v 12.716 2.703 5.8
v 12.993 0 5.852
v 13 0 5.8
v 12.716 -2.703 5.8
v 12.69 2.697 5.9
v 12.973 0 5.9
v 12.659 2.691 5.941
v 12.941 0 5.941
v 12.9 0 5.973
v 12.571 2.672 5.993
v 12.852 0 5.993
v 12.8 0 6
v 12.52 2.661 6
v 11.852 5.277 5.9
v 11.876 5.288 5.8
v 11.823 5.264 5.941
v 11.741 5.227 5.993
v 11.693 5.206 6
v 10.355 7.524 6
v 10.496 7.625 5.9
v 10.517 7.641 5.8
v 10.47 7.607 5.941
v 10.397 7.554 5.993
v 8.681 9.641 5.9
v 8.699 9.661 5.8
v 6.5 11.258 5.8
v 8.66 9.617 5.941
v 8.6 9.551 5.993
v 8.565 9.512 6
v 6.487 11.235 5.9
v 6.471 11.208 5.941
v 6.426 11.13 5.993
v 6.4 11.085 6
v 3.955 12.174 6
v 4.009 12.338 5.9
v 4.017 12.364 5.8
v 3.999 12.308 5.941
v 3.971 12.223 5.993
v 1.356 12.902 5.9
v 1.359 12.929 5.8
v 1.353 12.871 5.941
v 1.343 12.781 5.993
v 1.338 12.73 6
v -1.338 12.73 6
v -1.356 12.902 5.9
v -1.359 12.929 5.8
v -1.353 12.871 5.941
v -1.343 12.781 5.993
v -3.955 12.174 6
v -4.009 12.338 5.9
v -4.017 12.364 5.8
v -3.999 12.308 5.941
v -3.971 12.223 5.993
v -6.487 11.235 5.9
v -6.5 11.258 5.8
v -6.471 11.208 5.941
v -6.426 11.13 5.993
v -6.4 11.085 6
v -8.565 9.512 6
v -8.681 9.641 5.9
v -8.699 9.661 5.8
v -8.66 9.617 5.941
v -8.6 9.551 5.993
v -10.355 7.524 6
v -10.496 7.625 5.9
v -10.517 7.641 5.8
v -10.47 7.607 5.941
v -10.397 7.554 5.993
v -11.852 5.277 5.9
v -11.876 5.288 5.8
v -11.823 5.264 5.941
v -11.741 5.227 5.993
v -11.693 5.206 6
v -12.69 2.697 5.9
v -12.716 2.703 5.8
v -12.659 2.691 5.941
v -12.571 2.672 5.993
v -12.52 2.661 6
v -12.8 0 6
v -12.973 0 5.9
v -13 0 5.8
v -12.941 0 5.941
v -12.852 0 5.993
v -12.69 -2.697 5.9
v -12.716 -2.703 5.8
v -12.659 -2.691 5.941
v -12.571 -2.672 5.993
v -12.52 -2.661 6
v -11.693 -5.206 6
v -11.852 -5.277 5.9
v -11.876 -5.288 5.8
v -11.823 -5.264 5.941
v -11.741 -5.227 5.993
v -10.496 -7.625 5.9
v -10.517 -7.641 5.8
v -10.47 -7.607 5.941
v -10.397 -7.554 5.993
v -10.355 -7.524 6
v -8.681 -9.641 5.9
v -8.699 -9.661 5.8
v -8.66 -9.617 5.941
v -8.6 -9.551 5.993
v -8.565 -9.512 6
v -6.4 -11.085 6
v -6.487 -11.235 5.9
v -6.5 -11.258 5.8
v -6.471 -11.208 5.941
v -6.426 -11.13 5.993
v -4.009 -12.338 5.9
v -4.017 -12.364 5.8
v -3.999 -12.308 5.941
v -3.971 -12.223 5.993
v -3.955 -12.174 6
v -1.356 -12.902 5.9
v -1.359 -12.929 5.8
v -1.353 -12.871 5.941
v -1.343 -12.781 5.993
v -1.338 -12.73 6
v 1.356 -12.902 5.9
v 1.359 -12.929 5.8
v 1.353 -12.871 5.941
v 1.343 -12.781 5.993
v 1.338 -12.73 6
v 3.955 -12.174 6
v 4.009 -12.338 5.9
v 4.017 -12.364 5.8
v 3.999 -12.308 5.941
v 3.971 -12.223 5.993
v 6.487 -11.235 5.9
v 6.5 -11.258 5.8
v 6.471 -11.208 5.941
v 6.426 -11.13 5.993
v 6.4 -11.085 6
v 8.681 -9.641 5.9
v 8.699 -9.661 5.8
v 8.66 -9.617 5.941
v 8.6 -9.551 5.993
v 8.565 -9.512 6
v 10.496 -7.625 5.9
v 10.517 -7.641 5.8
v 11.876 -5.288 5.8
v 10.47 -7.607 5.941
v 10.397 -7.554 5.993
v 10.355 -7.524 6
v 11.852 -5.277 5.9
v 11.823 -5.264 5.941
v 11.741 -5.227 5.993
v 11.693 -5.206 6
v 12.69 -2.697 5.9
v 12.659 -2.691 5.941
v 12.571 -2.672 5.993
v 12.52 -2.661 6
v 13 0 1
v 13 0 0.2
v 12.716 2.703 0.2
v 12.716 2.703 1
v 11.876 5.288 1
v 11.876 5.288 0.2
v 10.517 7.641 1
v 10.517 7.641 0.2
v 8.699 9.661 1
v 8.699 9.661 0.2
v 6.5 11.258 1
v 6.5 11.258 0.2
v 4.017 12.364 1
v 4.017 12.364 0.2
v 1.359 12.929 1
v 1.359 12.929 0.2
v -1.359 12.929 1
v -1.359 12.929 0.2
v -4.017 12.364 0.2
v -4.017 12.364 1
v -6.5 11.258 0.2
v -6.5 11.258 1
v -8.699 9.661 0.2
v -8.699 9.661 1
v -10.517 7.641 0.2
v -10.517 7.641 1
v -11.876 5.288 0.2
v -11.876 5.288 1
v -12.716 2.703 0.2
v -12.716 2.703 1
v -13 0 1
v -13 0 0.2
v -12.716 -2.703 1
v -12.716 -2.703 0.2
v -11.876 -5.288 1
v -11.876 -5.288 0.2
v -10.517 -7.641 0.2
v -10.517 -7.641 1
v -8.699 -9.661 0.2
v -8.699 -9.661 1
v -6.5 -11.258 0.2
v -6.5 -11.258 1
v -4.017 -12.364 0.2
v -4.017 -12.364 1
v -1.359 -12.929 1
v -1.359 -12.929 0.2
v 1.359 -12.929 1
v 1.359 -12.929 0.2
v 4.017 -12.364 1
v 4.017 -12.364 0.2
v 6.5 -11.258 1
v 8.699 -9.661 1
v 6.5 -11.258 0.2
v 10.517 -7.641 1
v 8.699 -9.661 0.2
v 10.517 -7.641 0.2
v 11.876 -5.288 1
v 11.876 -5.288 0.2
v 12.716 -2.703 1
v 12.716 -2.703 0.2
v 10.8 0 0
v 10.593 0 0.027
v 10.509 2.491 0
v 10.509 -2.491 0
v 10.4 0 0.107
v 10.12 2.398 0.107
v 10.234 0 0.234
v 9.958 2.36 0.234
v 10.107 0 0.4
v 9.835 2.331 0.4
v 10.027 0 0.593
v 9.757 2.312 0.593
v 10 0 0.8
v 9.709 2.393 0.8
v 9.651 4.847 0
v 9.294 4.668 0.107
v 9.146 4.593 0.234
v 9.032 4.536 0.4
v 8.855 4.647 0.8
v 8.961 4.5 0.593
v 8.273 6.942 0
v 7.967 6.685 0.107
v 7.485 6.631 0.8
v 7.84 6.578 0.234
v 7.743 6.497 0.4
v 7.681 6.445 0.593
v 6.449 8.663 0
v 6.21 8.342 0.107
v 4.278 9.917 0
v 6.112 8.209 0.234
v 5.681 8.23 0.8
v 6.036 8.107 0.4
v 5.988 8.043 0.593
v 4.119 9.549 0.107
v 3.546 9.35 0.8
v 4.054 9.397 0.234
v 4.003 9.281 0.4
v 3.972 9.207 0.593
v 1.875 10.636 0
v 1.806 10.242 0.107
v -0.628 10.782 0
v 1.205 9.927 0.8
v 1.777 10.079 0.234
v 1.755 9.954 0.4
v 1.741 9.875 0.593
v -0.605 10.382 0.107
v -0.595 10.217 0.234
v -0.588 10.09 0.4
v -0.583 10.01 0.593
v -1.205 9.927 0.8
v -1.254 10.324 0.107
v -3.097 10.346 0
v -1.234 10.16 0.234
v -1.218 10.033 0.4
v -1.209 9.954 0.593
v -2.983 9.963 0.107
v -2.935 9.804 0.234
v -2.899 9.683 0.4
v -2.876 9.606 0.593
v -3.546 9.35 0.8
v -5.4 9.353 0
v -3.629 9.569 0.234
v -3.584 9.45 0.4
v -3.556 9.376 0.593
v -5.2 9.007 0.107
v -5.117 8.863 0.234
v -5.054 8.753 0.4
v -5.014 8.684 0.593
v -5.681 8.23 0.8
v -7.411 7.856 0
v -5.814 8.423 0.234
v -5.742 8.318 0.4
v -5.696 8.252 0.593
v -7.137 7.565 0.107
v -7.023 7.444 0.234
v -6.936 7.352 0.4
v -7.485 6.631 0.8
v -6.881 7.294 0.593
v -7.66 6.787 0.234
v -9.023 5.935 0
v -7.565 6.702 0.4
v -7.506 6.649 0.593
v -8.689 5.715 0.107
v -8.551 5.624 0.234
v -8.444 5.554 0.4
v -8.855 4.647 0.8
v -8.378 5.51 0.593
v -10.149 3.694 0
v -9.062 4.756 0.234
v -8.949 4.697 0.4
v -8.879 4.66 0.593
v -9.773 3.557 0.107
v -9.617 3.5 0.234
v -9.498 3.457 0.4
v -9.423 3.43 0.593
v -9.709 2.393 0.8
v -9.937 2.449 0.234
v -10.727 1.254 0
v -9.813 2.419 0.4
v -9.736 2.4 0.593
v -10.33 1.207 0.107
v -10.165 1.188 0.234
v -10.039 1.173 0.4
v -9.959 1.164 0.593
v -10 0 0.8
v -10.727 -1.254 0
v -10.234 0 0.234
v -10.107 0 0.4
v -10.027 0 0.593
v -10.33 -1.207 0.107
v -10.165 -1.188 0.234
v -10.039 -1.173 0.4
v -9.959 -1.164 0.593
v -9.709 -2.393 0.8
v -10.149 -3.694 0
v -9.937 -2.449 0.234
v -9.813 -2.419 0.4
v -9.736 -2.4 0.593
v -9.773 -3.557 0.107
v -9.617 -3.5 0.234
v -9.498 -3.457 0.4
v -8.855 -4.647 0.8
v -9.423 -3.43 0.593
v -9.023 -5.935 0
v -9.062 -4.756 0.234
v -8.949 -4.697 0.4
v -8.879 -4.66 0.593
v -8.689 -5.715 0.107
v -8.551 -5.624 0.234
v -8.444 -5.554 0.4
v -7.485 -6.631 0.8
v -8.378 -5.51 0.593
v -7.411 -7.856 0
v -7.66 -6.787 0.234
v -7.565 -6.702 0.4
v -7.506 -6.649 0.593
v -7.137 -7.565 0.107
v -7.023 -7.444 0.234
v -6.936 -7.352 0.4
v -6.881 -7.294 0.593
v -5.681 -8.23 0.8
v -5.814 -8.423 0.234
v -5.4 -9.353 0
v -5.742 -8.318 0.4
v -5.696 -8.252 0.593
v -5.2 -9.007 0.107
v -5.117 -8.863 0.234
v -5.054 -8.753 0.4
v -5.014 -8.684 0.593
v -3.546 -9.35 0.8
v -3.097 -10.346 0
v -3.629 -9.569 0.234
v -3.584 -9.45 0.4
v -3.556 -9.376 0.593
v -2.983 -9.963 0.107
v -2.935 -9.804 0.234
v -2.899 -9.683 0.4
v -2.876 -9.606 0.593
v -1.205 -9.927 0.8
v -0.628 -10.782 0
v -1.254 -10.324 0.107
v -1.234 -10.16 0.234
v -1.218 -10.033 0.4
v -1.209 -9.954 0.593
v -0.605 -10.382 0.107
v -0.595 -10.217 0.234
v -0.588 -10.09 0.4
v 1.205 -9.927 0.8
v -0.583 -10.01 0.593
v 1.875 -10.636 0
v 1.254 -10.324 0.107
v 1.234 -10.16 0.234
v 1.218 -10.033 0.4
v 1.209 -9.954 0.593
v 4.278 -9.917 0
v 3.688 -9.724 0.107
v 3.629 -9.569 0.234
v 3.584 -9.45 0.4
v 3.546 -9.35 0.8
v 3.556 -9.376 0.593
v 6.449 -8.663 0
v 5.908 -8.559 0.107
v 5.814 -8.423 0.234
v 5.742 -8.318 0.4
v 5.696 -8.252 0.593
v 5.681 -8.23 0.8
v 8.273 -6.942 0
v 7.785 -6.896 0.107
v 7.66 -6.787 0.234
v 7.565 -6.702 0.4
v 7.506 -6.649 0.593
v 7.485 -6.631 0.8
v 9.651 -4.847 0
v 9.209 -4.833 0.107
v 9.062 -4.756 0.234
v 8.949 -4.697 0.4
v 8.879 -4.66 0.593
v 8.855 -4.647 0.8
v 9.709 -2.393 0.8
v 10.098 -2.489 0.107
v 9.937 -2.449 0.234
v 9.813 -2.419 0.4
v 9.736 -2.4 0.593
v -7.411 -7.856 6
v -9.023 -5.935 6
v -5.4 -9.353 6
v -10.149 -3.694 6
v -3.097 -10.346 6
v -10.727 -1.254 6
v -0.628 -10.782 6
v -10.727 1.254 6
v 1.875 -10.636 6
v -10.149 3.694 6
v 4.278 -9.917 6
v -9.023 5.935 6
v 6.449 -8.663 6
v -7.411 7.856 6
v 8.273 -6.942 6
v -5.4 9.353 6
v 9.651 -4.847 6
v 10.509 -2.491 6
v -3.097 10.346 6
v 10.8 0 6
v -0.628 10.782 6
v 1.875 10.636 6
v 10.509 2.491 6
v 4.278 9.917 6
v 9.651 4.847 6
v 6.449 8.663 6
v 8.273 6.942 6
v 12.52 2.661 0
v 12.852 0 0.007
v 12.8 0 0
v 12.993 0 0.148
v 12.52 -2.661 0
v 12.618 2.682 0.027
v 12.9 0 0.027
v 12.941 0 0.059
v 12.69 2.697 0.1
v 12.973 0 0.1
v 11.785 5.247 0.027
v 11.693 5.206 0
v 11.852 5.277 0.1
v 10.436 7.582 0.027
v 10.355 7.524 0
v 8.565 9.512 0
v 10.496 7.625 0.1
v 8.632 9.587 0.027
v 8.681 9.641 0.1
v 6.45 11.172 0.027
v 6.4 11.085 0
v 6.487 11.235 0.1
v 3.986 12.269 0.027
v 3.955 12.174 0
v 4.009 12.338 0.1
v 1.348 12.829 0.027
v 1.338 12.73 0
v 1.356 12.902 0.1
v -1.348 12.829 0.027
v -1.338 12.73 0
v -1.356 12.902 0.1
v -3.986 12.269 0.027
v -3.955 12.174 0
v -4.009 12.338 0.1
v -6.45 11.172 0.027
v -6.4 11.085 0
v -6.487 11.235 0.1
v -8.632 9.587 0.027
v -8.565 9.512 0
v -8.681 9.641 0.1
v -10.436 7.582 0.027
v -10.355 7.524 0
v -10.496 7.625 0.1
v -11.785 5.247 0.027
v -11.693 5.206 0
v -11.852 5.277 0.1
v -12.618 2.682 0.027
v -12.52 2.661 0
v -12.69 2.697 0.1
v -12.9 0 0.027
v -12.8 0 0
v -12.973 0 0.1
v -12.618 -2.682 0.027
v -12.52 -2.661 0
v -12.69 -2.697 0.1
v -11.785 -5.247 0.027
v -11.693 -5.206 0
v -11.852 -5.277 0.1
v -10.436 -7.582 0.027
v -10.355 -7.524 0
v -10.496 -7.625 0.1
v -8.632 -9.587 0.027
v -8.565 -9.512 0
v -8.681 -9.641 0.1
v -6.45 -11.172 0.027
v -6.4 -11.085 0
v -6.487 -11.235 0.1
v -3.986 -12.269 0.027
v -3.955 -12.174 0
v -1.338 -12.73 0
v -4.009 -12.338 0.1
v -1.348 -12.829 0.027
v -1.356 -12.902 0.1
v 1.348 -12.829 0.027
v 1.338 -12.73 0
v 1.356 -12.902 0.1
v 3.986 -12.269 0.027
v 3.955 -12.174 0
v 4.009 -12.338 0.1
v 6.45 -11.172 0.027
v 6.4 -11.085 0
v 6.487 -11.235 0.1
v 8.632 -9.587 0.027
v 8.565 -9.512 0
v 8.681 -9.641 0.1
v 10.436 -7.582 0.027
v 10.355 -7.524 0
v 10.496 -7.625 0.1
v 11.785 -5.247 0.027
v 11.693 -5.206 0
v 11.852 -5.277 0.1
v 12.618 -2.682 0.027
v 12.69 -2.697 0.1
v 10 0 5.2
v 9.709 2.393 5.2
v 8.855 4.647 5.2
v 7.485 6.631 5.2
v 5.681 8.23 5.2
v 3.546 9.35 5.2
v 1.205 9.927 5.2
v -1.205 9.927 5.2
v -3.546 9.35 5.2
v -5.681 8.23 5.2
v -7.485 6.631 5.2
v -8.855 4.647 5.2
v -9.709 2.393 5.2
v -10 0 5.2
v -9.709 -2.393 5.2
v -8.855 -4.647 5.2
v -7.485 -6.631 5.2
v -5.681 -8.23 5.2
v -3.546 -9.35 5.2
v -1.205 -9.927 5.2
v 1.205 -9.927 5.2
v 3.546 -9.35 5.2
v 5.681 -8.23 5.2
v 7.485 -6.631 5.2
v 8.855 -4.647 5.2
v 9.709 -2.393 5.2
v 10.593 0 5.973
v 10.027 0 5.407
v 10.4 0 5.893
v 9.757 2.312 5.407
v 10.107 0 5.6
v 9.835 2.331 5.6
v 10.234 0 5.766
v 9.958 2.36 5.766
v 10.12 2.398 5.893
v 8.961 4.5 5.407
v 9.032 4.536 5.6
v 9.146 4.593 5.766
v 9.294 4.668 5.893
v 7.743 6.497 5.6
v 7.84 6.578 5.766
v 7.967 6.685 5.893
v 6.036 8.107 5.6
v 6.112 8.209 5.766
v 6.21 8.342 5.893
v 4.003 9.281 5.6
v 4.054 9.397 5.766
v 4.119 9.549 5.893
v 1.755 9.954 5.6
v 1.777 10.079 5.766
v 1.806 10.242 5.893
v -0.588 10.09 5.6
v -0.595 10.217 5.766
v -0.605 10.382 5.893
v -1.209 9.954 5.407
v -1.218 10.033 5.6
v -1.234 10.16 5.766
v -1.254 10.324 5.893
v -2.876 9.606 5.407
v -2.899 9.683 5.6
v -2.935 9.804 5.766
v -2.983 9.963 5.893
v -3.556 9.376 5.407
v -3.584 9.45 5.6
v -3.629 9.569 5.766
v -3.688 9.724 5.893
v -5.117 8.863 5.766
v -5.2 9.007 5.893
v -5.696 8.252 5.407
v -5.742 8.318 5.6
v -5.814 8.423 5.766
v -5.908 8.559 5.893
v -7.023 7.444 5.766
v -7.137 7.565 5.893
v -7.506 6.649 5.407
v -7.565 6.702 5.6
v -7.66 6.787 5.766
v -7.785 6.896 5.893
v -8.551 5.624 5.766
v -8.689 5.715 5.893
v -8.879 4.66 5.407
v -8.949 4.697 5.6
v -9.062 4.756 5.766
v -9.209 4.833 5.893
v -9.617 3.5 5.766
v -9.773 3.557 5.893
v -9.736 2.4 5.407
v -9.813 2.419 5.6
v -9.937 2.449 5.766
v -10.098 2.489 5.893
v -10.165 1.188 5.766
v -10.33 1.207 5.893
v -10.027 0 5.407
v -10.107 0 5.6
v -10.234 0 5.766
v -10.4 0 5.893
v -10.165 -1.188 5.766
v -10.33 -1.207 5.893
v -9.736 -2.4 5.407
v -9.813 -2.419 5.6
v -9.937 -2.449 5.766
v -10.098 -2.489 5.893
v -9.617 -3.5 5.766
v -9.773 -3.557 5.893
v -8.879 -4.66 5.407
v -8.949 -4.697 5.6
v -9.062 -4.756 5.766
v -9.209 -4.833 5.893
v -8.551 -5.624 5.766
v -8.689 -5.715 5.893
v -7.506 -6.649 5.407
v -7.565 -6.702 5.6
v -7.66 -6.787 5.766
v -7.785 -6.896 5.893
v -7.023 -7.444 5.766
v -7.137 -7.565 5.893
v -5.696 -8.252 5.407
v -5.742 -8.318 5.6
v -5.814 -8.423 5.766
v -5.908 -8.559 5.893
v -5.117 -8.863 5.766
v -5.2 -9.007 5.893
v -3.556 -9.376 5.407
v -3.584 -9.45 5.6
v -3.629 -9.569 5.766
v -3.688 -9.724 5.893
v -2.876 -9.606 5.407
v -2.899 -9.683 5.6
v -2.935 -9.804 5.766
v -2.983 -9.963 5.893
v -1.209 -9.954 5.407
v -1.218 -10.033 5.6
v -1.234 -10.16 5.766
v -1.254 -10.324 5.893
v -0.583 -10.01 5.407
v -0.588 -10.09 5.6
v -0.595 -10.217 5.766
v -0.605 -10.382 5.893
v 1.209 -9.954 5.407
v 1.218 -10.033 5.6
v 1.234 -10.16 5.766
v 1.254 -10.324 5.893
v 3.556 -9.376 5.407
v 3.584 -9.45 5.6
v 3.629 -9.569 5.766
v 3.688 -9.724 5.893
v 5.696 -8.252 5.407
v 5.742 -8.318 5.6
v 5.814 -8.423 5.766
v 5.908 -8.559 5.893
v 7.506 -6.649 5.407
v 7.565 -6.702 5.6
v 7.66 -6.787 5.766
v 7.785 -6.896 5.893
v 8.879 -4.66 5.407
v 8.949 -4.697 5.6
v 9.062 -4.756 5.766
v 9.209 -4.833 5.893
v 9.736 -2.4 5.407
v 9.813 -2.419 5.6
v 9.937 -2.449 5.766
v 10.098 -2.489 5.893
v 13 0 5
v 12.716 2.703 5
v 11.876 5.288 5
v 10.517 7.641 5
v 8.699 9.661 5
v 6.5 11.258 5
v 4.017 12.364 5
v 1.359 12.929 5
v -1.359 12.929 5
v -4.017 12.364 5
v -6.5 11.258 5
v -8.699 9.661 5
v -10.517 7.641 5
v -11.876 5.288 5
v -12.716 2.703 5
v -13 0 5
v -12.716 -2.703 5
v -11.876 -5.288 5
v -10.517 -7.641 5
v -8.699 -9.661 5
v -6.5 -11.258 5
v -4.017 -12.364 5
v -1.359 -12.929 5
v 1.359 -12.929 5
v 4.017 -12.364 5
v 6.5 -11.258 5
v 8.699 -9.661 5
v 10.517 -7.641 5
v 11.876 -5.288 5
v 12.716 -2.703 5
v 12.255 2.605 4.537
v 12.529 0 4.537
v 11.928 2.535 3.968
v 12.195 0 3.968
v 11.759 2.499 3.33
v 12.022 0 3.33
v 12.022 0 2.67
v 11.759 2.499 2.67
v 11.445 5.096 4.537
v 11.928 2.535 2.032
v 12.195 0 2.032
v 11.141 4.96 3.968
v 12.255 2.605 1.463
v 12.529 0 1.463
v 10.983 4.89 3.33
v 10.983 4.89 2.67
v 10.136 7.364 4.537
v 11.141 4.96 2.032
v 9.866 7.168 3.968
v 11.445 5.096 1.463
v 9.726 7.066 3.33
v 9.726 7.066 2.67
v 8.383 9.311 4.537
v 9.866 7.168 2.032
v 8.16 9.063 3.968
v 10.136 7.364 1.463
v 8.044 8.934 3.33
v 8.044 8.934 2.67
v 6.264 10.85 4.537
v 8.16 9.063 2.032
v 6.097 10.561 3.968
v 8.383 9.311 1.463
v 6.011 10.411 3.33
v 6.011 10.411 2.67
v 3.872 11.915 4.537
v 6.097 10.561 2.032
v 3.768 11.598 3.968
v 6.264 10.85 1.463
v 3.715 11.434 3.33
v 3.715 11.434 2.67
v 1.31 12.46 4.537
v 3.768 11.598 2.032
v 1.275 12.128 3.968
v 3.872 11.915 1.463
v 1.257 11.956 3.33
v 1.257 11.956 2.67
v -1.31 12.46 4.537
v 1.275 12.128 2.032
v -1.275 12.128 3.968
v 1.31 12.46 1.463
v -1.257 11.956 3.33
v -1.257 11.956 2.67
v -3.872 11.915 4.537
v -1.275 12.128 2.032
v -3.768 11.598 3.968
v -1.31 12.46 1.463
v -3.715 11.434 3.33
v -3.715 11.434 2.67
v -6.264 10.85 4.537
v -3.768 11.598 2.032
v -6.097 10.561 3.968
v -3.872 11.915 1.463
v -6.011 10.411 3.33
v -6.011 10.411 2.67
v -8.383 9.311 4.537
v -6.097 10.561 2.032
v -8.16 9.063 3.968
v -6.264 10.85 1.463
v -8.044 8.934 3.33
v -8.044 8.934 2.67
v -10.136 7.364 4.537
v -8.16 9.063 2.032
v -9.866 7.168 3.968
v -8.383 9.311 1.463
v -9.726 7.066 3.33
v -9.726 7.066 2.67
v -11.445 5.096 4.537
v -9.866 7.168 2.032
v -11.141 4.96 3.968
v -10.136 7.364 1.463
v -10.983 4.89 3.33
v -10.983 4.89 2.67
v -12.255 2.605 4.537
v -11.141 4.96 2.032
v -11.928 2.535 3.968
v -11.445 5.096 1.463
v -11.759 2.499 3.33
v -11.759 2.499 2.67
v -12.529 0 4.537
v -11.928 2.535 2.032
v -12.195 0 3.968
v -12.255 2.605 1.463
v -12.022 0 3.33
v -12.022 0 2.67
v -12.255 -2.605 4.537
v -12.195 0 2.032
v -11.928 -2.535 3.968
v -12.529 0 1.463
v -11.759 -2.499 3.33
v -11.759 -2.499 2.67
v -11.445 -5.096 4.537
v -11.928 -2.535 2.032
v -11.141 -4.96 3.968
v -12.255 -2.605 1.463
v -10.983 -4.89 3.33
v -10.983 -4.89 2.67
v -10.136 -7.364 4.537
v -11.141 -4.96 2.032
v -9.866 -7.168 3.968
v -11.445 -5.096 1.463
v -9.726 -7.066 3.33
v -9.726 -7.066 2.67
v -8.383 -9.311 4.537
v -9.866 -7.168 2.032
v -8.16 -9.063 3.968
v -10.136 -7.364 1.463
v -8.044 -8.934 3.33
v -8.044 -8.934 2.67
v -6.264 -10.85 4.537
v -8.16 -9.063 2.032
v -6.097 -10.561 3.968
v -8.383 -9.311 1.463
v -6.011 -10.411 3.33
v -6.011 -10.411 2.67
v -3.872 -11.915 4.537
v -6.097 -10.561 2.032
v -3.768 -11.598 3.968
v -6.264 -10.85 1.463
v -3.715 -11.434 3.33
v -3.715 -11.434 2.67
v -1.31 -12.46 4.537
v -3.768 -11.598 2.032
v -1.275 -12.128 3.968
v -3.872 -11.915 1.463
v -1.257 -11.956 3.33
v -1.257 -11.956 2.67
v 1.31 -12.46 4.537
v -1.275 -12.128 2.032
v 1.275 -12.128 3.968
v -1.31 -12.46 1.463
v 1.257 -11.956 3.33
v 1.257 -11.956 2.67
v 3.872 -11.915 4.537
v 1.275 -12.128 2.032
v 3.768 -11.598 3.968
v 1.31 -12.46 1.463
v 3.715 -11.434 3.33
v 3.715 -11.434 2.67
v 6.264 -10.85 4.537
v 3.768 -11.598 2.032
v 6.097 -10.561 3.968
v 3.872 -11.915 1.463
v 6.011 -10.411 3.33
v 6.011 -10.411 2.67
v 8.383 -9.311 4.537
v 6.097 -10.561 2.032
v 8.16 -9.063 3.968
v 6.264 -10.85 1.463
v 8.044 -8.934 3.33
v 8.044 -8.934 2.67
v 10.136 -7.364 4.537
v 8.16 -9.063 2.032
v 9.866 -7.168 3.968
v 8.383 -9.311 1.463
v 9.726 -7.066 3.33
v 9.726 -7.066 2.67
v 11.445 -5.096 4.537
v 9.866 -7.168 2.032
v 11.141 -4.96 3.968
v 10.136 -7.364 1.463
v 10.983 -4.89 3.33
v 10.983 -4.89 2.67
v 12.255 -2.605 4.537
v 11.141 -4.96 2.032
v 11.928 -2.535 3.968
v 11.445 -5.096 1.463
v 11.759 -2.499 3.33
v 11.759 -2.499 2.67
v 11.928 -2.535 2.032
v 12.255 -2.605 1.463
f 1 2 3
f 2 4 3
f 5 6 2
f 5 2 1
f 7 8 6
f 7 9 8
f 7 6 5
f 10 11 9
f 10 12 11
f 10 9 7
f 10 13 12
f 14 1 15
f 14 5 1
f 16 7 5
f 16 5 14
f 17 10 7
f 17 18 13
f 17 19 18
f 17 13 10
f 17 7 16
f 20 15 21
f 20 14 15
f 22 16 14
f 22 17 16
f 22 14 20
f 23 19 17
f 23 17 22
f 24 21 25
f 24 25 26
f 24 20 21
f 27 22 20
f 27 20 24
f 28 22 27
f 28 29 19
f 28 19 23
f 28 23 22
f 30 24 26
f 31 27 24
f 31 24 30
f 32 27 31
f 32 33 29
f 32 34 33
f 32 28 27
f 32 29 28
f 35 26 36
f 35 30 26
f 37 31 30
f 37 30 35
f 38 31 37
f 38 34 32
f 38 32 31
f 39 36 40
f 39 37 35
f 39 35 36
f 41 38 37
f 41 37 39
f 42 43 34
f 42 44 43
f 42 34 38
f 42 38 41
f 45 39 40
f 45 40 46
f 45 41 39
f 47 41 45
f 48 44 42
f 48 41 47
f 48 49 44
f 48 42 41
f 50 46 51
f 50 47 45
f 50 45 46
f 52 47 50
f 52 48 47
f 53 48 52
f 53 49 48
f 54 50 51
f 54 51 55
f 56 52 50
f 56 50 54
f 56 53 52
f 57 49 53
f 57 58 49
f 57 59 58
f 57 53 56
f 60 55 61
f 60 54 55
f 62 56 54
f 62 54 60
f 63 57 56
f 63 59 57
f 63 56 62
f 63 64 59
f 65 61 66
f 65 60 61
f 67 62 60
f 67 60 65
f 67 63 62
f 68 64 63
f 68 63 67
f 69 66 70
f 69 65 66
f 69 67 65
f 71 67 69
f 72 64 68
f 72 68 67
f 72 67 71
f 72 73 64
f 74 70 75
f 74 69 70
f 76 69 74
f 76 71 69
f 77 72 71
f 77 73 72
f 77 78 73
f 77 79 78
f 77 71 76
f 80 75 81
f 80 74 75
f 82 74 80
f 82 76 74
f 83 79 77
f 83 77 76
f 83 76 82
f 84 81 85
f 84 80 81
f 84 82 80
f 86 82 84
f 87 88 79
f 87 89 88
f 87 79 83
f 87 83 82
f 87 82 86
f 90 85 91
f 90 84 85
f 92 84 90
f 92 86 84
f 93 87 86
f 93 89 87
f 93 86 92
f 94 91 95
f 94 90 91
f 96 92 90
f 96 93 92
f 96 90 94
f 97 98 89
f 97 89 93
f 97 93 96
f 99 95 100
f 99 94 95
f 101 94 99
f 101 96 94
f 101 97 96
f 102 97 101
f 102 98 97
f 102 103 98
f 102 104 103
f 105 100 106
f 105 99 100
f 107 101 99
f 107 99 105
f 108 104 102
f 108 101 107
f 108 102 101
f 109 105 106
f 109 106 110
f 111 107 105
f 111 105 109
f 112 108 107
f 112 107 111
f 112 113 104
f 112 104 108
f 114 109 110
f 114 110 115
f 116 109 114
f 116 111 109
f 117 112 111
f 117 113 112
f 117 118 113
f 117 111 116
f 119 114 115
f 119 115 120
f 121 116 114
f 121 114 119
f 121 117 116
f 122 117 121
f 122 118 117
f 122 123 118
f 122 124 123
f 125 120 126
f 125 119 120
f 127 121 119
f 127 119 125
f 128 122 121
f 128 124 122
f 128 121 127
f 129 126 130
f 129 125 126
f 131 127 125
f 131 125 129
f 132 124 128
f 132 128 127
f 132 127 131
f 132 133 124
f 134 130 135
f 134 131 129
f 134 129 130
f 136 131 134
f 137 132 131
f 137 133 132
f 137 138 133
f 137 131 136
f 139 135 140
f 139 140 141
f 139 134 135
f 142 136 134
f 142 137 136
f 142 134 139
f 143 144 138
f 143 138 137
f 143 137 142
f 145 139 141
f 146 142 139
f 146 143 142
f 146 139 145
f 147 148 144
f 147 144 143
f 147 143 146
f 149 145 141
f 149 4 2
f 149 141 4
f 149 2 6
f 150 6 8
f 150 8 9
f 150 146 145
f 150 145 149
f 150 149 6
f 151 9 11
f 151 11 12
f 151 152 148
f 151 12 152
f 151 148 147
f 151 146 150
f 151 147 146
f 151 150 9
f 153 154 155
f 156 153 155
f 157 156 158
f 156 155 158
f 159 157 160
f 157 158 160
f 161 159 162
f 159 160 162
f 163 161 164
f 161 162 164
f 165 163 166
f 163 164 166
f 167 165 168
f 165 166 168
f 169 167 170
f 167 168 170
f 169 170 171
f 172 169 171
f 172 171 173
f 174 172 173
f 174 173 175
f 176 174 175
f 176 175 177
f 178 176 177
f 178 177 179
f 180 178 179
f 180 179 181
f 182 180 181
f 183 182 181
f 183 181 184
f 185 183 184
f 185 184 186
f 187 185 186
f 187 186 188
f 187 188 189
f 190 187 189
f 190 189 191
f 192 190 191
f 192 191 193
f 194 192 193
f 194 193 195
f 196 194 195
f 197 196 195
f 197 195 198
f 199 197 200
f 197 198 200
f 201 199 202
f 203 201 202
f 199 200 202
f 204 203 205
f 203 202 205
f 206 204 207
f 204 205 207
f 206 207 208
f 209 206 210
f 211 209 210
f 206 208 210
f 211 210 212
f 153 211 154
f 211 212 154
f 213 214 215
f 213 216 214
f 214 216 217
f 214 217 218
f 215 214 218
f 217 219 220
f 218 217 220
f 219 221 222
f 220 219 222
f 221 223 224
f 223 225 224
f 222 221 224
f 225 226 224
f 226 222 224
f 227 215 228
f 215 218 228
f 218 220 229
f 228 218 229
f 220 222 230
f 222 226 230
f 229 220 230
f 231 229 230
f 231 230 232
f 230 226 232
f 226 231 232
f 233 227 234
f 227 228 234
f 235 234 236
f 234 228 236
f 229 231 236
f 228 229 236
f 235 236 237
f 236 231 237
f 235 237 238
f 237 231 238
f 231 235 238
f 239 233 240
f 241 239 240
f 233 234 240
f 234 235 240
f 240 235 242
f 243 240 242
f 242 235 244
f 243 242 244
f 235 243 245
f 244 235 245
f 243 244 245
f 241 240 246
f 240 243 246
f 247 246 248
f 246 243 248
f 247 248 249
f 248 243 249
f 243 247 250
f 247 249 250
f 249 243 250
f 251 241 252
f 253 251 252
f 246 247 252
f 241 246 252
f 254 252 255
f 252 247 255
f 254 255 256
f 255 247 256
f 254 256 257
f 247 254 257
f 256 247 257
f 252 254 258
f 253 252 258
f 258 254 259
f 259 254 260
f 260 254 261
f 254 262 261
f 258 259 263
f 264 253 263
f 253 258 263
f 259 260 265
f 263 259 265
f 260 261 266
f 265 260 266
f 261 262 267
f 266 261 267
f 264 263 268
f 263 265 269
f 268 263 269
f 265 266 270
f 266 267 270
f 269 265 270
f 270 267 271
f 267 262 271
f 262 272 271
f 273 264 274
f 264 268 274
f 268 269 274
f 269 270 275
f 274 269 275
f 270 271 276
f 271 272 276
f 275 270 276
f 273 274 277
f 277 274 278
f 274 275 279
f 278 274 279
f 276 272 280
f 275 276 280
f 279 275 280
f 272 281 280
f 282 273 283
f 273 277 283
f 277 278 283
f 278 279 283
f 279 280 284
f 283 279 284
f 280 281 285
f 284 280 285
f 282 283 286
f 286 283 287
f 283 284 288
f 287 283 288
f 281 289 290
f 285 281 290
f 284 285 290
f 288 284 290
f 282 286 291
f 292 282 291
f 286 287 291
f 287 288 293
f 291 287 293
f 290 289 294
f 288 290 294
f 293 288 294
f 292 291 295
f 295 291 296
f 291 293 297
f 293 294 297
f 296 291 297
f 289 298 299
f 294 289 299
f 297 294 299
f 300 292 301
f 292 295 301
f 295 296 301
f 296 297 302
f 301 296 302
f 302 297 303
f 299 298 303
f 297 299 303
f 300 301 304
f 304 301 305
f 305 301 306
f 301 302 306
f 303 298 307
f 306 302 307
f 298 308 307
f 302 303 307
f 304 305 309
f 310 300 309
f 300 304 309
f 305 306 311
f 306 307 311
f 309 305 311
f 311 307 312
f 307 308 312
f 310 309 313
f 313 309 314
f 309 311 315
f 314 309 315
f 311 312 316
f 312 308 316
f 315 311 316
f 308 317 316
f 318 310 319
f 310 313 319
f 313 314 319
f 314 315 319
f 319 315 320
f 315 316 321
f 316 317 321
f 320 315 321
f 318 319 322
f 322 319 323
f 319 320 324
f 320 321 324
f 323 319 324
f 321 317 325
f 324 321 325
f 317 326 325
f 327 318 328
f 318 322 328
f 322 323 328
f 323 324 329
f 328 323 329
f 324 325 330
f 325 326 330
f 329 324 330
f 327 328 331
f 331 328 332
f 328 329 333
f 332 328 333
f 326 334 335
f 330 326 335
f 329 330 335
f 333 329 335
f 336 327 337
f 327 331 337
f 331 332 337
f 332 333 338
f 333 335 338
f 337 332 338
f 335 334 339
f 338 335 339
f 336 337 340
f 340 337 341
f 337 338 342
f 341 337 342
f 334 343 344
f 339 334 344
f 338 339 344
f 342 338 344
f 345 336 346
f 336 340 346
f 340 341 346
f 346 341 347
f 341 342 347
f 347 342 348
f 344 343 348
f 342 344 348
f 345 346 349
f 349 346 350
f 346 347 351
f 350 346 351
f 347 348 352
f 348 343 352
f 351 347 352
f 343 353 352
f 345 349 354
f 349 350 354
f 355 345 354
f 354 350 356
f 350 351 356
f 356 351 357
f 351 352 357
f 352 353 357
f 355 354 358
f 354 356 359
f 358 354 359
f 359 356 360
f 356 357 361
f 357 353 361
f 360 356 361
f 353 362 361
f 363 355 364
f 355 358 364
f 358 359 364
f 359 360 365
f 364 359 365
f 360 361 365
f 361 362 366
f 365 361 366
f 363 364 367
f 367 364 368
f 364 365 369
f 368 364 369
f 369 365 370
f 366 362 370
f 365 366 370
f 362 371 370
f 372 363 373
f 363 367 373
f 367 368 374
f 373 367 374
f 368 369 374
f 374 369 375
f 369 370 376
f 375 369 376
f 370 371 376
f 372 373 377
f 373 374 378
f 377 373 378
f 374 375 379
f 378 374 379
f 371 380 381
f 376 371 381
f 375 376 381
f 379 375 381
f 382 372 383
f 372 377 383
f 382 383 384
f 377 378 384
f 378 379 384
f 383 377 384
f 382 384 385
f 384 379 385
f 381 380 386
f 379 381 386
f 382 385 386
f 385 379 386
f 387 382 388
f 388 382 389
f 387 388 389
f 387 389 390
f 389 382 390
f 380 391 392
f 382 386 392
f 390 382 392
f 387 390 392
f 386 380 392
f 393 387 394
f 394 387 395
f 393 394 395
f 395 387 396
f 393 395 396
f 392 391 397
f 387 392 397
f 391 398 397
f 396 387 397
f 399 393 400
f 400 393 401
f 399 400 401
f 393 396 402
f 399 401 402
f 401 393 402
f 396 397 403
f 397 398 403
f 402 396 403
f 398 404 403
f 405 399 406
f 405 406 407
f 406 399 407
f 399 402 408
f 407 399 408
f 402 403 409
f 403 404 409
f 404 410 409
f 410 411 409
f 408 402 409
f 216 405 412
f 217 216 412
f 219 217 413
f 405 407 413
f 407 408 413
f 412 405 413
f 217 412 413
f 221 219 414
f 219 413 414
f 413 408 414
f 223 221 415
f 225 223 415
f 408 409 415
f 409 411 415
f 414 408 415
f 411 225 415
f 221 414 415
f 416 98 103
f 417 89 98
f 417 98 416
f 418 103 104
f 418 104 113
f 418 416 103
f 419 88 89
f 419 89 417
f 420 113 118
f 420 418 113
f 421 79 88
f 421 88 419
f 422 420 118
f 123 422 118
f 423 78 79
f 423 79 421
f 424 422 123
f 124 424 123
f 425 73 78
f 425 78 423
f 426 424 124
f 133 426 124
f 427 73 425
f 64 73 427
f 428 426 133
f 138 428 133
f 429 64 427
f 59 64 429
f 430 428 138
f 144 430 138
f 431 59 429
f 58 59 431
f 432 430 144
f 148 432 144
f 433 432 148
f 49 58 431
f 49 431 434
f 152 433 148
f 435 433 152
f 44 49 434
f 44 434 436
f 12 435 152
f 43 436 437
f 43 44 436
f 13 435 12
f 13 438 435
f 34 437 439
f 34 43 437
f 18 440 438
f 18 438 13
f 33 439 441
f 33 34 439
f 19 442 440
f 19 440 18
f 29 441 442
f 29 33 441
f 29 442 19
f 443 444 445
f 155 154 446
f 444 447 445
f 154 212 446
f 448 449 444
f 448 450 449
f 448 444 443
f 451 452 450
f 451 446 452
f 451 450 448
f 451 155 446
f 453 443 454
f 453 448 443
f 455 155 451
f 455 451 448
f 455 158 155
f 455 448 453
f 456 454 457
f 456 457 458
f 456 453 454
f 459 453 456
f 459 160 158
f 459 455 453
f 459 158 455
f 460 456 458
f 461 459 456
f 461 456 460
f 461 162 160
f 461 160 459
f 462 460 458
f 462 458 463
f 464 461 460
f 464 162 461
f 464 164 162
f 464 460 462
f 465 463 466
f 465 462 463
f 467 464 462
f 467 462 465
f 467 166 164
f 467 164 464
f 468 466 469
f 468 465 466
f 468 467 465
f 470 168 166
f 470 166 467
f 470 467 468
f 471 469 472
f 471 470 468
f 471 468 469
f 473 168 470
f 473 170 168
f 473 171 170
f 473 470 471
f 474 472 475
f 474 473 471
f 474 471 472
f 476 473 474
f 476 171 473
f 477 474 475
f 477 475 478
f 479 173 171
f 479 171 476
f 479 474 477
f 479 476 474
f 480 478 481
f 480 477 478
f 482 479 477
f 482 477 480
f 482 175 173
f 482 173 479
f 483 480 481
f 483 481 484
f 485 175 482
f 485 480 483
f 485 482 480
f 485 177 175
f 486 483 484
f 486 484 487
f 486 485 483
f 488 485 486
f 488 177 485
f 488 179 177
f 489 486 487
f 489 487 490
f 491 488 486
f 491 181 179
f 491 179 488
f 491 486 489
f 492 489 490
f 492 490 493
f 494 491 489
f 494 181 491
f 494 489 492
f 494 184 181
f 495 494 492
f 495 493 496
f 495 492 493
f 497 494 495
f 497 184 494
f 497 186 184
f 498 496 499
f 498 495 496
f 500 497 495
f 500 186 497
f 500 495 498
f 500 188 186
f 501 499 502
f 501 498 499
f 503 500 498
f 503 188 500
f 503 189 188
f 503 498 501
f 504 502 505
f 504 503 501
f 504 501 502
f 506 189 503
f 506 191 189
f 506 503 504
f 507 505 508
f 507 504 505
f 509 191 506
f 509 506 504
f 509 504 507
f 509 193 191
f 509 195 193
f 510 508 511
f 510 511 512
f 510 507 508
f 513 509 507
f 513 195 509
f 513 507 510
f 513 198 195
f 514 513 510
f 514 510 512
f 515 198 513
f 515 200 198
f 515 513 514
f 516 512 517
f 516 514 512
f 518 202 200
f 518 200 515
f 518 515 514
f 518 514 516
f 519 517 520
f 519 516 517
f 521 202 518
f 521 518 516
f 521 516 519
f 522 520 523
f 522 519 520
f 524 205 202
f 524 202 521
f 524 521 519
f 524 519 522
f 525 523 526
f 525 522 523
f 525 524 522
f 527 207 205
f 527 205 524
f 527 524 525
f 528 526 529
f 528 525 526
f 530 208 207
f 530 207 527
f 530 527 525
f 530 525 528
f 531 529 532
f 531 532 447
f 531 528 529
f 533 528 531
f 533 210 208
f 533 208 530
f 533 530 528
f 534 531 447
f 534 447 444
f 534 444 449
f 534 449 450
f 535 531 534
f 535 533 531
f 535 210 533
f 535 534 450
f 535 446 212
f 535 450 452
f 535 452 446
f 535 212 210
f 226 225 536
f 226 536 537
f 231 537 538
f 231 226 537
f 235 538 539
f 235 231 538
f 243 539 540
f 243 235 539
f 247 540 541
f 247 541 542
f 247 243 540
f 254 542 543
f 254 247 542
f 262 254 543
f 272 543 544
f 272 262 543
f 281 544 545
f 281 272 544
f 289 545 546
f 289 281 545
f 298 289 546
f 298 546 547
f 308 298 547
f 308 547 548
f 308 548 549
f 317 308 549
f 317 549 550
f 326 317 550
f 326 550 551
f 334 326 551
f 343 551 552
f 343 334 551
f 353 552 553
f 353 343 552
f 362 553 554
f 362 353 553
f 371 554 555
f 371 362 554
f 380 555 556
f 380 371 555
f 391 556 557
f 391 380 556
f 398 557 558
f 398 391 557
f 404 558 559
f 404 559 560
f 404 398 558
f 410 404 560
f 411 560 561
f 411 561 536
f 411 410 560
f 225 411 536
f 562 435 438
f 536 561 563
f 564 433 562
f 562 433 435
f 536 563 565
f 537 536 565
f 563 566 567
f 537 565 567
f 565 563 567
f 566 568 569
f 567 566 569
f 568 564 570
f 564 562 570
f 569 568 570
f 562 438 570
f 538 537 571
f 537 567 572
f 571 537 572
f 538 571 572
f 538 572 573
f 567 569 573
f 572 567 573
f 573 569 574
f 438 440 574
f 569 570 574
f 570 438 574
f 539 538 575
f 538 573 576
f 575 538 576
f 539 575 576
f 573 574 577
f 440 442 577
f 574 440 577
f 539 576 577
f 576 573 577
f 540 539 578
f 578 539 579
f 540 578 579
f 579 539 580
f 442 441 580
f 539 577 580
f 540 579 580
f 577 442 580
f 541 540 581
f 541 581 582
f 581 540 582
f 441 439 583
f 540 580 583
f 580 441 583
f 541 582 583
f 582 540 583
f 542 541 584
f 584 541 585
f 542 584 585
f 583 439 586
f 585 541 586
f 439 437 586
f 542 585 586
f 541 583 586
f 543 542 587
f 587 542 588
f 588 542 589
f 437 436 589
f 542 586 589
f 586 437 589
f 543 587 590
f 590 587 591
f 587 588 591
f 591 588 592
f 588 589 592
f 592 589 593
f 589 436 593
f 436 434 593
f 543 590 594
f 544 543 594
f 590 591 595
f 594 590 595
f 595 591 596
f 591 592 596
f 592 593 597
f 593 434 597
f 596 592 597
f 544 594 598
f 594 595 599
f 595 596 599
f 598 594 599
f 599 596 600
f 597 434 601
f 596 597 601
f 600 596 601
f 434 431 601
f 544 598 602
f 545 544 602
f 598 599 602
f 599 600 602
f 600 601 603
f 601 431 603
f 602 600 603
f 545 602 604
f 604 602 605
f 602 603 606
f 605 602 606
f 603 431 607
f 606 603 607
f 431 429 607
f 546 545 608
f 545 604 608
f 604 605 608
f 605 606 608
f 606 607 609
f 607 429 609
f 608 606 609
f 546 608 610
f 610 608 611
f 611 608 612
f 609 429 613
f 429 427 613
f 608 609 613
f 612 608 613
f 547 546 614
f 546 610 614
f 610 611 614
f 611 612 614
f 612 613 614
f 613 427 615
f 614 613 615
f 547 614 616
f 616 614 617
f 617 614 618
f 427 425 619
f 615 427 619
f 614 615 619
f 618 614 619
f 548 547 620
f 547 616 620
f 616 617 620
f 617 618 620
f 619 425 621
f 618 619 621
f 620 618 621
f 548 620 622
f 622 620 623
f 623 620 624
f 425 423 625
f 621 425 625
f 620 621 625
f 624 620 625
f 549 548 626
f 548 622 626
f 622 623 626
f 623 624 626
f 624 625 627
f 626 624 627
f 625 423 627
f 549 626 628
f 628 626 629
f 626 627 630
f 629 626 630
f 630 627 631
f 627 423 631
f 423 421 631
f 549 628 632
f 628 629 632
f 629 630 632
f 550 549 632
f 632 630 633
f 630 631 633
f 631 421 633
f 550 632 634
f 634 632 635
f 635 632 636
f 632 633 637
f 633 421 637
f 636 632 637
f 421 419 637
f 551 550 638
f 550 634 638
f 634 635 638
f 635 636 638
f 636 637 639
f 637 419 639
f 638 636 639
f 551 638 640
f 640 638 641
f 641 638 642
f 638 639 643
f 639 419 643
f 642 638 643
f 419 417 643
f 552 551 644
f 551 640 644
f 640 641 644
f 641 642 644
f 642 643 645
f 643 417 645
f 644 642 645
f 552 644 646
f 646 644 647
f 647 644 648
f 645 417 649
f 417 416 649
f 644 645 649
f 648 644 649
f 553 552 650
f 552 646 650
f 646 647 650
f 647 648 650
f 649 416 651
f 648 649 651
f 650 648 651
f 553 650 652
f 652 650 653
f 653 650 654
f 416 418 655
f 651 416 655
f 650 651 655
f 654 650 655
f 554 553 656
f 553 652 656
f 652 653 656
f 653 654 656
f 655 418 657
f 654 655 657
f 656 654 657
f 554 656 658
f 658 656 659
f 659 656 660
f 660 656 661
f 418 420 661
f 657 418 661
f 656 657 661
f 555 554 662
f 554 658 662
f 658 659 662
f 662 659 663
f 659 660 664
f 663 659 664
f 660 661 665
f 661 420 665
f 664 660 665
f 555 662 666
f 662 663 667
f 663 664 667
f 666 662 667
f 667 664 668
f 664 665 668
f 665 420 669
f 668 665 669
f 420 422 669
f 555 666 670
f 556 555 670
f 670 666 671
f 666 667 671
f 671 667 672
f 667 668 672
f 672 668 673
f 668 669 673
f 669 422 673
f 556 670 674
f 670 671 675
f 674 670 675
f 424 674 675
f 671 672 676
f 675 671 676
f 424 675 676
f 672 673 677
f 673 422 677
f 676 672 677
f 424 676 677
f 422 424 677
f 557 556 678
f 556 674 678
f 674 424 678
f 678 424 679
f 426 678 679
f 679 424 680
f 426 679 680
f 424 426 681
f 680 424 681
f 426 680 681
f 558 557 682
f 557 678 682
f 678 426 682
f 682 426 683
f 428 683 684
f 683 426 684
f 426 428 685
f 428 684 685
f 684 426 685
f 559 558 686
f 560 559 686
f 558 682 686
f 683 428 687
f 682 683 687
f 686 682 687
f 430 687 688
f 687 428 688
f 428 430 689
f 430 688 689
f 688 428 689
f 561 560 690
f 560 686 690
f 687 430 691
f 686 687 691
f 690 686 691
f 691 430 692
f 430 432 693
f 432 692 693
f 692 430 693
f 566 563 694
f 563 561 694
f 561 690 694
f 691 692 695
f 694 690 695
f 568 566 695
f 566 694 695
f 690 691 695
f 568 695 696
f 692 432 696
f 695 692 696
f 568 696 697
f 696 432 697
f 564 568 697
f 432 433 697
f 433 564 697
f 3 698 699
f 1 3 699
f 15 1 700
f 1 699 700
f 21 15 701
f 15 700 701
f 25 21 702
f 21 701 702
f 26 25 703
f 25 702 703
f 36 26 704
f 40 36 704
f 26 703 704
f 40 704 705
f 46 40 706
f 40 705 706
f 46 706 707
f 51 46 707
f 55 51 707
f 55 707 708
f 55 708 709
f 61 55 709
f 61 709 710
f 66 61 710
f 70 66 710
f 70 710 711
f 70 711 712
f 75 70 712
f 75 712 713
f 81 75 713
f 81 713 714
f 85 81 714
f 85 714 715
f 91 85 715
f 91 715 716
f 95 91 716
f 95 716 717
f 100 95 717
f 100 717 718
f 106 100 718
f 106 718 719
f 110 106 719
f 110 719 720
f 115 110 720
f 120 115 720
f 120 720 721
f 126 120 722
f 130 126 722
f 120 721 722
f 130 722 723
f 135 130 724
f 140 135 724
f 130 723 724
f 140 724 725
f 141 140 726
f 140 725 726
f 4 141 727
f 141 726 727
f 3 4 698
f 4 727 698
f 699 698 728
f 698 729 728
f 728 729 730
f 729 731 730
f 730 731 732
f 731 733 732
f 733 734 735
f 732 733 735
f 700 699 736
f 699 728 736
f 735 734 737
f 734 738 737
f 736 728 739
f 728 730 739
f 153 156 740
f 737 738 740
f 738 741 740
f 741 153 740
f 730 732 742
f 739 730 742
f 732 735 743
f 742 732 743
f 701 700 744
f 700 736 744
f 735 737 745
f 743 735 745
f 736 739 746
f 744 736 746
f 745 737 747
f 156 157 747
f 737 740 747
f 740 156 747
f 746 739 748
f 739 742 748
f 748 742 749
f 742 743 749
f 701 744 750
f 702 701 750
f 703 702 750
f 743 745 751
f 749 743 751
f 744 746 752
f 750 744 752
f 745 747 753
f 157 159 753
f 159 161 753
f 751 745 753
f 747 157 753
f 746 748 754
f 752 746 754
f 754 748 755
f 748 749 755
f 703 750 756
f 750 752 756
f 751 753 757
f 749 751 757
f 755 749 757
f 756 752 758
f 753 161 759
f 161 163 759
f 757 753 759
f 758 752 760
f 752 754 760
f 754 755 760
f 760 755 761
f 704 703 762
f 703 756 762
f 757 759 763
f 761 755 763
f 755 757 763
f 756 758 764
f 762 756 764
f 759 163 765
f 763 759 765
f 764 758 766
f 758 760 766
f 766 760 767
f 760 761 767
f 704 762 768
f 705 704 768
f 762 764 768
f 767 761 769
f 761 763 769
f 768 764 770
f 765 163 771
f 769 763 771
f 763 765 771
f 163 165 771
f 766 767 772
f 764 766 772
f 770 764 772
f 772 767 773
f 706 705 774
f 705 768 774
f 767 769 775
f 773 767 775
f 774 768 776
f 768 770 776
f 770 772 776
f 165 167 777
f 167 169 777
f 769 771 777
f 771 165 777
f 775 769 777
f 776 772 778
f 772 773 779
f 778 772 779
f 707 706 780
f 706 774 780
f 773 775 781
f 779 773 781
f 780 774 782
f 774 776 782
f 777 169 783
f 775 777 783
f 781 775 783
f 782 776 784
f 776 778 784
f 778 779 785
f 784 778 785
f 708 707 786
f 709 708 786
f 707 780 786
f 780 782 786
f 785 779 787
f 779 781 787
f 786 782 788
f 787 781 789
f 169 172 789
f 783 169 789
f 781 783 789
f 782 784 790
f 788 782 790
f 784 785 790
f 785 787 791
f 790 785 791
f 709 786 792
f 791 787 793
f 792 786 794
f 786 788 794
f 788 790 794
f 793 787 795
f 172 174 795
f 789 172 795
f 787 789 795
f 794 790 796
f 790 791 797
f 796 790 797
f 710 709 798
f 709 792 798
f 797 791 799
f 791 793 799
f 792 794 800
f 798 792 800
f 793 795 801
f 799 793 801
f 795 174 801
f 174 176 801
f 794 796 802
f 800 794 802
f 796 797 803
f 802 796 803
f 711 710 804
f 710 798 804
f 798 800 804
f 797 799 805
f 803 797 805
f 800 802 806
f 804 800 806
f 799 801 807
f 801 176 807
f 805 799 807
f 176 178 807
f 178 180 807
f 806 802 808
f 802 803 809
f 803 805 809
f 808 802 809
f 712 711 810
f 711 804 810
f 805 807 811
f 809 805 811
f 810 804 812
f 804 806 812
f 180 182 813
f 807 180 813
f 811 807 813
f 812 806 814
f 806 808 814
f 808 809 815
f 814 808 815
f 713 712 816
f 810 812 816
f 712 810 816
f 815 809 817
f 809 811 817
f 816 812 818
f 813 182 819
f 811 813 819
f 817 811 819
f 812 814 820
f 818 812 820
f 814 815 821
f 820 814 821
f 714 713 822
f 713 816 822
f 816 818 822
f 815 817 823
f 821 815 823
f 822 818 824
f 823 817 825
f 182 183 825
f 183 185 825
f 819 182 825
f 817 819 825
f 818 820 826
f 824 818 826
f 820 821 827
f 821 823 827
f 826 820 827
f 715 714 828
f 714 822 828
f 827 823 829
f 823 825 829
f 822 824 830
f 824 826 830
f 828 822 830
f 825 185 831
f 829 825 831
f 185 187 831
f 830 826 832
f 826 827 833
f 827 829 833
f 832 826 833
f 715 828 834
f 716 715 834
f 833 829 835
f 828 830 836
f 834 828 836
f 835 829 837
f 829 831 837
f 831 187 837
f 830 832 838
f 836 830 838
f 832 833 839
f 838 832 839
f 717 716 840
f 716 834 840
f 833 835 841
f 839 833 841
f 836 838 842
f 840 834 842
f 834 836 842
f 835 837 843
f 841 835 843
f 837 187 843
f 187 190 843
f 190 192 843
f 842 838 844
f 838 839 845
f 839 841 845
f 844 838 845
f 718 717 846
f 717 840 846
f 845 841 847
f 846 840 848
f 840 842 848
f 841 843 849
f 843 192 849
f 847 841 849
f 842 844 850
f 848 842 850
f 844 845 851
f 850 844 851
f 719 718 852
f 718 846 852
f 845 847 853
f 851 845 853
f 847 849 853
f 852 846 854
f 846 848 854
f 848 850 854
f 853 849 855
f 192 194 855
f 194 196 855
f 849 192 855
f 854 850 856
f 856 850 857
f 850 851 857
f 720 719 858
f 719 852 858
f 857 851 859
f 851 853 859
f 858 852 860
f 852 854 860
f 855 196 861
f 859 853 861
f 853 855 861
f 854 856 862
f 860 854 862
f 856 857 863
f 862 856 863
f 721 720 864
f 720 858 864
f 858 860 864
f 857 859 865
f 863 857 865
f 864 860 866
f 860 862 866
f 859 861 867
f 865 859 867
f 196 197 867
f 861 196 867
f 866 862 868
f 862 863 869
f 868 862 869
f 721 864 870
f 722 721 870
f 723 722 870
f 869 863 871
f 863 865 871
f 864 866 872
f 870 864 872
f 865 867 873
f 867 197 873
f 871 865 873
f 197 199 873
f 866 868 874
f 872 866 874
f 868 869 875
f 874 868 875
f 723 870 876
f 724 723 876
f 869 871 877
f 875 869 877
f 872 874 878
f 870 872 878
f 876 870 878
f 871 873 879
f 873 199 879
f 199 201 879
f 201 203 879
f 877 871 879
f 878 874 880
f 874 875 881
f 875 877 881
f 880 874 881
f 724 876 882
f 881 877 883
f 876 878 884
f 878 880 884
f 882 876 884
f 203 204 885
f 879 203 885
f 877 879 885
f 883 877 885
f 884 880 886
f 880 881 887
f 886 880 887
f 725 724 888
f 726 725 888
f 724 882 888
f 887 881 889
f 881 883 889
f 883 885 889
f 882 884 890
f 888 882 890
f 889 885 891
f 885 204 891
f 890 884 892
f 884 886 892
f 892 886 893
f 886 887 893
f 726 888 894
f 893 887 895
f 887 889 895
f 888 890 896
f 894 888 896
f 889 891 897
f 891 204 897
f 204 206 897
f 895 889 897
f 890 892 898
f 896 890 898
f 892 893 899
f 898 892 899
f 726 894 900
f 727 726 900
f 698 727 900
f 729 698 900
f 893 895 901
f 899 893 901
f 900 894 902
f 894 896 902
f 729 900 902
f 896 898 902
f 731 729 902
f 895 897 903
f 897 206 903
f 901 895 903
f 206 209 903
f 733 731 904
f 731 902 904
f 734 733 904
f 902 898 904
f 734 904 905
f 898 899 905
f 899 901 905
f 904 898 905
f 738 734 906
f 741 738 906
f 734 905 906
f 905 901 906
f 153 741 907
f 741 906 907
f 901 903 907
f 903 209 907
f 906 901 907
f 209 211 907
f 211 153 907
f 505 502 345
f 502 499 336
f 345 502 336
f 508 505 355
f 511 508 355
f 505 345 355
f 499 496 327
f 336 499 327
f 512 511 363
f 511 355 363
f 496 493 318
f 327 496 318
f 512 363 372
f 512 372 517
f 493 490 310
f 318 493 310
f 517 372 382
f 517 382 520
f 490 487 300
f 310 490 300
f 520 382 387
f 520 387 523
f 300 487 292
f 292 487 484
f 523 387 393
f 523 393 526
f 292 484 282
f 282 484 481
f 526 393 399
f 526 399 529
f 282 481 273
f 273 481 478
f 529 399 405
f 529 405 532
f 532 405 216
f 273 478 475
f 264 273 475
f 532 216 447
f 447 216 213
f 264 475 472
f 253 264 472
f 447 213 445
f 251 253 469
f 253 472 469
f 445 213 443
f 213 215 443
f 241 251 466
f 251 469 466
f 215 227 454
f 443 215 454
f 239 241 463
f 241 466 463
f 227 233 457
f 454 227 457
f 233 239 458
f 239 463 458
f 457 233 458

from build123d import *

# Parameters (mm, degrees)
SKETCH_1_R      = 13
SKETCH_1_R_2    = 10
EXTRUDE_1_DEPTH = 6
FILLET_1_R      = 0.8
FILLET_2_R      = 0.2


# Read off the part's stored shape, not the designer's step: 压凹5
with BuildPart() as part:
    # 草图1 → 凸台-拉伸1 (new body)
    with BuildSketch(Plane.XY):
        Circle(SKETCH_1_R)
        Circle(SKETCH_1_R_2, mode=Mode.SUBTRACT)
    extrude(amount=EXTRUDE_1_DEPTH)

    # 压凹5 outline → 压凹5 (revolve, cut)
    with BuildSketch(Plane.XZ):
        with BuildLine():
            Line((13, 1), (13, 5))
            ThreePointArc((13, 5), (12, 3), (13, 1))
        make_face()
    revolve(axis=Axis((0, 0, 0), (0, 0, 1)), mode=Mode.SUBTRACT)

    # 圆角1
    fillet_1_edges = [part.edges().sort_by_distance(p)[0] for p in [
        (-10, 0, 0),
        (-10, 0, 6),
    ]]
    fillet(fillet_1_edges, radius=FILLET_1_R)

    # 圆角2
    fillet_2_edges = [part.edges().sort_by_distance(p)[0] for p in [
        (-13, 0, 0),
        (-13, 0, 6),
    ]]
    fillet(fillet_2_edges, radius=FILLET_2_R)


solid = part.part
